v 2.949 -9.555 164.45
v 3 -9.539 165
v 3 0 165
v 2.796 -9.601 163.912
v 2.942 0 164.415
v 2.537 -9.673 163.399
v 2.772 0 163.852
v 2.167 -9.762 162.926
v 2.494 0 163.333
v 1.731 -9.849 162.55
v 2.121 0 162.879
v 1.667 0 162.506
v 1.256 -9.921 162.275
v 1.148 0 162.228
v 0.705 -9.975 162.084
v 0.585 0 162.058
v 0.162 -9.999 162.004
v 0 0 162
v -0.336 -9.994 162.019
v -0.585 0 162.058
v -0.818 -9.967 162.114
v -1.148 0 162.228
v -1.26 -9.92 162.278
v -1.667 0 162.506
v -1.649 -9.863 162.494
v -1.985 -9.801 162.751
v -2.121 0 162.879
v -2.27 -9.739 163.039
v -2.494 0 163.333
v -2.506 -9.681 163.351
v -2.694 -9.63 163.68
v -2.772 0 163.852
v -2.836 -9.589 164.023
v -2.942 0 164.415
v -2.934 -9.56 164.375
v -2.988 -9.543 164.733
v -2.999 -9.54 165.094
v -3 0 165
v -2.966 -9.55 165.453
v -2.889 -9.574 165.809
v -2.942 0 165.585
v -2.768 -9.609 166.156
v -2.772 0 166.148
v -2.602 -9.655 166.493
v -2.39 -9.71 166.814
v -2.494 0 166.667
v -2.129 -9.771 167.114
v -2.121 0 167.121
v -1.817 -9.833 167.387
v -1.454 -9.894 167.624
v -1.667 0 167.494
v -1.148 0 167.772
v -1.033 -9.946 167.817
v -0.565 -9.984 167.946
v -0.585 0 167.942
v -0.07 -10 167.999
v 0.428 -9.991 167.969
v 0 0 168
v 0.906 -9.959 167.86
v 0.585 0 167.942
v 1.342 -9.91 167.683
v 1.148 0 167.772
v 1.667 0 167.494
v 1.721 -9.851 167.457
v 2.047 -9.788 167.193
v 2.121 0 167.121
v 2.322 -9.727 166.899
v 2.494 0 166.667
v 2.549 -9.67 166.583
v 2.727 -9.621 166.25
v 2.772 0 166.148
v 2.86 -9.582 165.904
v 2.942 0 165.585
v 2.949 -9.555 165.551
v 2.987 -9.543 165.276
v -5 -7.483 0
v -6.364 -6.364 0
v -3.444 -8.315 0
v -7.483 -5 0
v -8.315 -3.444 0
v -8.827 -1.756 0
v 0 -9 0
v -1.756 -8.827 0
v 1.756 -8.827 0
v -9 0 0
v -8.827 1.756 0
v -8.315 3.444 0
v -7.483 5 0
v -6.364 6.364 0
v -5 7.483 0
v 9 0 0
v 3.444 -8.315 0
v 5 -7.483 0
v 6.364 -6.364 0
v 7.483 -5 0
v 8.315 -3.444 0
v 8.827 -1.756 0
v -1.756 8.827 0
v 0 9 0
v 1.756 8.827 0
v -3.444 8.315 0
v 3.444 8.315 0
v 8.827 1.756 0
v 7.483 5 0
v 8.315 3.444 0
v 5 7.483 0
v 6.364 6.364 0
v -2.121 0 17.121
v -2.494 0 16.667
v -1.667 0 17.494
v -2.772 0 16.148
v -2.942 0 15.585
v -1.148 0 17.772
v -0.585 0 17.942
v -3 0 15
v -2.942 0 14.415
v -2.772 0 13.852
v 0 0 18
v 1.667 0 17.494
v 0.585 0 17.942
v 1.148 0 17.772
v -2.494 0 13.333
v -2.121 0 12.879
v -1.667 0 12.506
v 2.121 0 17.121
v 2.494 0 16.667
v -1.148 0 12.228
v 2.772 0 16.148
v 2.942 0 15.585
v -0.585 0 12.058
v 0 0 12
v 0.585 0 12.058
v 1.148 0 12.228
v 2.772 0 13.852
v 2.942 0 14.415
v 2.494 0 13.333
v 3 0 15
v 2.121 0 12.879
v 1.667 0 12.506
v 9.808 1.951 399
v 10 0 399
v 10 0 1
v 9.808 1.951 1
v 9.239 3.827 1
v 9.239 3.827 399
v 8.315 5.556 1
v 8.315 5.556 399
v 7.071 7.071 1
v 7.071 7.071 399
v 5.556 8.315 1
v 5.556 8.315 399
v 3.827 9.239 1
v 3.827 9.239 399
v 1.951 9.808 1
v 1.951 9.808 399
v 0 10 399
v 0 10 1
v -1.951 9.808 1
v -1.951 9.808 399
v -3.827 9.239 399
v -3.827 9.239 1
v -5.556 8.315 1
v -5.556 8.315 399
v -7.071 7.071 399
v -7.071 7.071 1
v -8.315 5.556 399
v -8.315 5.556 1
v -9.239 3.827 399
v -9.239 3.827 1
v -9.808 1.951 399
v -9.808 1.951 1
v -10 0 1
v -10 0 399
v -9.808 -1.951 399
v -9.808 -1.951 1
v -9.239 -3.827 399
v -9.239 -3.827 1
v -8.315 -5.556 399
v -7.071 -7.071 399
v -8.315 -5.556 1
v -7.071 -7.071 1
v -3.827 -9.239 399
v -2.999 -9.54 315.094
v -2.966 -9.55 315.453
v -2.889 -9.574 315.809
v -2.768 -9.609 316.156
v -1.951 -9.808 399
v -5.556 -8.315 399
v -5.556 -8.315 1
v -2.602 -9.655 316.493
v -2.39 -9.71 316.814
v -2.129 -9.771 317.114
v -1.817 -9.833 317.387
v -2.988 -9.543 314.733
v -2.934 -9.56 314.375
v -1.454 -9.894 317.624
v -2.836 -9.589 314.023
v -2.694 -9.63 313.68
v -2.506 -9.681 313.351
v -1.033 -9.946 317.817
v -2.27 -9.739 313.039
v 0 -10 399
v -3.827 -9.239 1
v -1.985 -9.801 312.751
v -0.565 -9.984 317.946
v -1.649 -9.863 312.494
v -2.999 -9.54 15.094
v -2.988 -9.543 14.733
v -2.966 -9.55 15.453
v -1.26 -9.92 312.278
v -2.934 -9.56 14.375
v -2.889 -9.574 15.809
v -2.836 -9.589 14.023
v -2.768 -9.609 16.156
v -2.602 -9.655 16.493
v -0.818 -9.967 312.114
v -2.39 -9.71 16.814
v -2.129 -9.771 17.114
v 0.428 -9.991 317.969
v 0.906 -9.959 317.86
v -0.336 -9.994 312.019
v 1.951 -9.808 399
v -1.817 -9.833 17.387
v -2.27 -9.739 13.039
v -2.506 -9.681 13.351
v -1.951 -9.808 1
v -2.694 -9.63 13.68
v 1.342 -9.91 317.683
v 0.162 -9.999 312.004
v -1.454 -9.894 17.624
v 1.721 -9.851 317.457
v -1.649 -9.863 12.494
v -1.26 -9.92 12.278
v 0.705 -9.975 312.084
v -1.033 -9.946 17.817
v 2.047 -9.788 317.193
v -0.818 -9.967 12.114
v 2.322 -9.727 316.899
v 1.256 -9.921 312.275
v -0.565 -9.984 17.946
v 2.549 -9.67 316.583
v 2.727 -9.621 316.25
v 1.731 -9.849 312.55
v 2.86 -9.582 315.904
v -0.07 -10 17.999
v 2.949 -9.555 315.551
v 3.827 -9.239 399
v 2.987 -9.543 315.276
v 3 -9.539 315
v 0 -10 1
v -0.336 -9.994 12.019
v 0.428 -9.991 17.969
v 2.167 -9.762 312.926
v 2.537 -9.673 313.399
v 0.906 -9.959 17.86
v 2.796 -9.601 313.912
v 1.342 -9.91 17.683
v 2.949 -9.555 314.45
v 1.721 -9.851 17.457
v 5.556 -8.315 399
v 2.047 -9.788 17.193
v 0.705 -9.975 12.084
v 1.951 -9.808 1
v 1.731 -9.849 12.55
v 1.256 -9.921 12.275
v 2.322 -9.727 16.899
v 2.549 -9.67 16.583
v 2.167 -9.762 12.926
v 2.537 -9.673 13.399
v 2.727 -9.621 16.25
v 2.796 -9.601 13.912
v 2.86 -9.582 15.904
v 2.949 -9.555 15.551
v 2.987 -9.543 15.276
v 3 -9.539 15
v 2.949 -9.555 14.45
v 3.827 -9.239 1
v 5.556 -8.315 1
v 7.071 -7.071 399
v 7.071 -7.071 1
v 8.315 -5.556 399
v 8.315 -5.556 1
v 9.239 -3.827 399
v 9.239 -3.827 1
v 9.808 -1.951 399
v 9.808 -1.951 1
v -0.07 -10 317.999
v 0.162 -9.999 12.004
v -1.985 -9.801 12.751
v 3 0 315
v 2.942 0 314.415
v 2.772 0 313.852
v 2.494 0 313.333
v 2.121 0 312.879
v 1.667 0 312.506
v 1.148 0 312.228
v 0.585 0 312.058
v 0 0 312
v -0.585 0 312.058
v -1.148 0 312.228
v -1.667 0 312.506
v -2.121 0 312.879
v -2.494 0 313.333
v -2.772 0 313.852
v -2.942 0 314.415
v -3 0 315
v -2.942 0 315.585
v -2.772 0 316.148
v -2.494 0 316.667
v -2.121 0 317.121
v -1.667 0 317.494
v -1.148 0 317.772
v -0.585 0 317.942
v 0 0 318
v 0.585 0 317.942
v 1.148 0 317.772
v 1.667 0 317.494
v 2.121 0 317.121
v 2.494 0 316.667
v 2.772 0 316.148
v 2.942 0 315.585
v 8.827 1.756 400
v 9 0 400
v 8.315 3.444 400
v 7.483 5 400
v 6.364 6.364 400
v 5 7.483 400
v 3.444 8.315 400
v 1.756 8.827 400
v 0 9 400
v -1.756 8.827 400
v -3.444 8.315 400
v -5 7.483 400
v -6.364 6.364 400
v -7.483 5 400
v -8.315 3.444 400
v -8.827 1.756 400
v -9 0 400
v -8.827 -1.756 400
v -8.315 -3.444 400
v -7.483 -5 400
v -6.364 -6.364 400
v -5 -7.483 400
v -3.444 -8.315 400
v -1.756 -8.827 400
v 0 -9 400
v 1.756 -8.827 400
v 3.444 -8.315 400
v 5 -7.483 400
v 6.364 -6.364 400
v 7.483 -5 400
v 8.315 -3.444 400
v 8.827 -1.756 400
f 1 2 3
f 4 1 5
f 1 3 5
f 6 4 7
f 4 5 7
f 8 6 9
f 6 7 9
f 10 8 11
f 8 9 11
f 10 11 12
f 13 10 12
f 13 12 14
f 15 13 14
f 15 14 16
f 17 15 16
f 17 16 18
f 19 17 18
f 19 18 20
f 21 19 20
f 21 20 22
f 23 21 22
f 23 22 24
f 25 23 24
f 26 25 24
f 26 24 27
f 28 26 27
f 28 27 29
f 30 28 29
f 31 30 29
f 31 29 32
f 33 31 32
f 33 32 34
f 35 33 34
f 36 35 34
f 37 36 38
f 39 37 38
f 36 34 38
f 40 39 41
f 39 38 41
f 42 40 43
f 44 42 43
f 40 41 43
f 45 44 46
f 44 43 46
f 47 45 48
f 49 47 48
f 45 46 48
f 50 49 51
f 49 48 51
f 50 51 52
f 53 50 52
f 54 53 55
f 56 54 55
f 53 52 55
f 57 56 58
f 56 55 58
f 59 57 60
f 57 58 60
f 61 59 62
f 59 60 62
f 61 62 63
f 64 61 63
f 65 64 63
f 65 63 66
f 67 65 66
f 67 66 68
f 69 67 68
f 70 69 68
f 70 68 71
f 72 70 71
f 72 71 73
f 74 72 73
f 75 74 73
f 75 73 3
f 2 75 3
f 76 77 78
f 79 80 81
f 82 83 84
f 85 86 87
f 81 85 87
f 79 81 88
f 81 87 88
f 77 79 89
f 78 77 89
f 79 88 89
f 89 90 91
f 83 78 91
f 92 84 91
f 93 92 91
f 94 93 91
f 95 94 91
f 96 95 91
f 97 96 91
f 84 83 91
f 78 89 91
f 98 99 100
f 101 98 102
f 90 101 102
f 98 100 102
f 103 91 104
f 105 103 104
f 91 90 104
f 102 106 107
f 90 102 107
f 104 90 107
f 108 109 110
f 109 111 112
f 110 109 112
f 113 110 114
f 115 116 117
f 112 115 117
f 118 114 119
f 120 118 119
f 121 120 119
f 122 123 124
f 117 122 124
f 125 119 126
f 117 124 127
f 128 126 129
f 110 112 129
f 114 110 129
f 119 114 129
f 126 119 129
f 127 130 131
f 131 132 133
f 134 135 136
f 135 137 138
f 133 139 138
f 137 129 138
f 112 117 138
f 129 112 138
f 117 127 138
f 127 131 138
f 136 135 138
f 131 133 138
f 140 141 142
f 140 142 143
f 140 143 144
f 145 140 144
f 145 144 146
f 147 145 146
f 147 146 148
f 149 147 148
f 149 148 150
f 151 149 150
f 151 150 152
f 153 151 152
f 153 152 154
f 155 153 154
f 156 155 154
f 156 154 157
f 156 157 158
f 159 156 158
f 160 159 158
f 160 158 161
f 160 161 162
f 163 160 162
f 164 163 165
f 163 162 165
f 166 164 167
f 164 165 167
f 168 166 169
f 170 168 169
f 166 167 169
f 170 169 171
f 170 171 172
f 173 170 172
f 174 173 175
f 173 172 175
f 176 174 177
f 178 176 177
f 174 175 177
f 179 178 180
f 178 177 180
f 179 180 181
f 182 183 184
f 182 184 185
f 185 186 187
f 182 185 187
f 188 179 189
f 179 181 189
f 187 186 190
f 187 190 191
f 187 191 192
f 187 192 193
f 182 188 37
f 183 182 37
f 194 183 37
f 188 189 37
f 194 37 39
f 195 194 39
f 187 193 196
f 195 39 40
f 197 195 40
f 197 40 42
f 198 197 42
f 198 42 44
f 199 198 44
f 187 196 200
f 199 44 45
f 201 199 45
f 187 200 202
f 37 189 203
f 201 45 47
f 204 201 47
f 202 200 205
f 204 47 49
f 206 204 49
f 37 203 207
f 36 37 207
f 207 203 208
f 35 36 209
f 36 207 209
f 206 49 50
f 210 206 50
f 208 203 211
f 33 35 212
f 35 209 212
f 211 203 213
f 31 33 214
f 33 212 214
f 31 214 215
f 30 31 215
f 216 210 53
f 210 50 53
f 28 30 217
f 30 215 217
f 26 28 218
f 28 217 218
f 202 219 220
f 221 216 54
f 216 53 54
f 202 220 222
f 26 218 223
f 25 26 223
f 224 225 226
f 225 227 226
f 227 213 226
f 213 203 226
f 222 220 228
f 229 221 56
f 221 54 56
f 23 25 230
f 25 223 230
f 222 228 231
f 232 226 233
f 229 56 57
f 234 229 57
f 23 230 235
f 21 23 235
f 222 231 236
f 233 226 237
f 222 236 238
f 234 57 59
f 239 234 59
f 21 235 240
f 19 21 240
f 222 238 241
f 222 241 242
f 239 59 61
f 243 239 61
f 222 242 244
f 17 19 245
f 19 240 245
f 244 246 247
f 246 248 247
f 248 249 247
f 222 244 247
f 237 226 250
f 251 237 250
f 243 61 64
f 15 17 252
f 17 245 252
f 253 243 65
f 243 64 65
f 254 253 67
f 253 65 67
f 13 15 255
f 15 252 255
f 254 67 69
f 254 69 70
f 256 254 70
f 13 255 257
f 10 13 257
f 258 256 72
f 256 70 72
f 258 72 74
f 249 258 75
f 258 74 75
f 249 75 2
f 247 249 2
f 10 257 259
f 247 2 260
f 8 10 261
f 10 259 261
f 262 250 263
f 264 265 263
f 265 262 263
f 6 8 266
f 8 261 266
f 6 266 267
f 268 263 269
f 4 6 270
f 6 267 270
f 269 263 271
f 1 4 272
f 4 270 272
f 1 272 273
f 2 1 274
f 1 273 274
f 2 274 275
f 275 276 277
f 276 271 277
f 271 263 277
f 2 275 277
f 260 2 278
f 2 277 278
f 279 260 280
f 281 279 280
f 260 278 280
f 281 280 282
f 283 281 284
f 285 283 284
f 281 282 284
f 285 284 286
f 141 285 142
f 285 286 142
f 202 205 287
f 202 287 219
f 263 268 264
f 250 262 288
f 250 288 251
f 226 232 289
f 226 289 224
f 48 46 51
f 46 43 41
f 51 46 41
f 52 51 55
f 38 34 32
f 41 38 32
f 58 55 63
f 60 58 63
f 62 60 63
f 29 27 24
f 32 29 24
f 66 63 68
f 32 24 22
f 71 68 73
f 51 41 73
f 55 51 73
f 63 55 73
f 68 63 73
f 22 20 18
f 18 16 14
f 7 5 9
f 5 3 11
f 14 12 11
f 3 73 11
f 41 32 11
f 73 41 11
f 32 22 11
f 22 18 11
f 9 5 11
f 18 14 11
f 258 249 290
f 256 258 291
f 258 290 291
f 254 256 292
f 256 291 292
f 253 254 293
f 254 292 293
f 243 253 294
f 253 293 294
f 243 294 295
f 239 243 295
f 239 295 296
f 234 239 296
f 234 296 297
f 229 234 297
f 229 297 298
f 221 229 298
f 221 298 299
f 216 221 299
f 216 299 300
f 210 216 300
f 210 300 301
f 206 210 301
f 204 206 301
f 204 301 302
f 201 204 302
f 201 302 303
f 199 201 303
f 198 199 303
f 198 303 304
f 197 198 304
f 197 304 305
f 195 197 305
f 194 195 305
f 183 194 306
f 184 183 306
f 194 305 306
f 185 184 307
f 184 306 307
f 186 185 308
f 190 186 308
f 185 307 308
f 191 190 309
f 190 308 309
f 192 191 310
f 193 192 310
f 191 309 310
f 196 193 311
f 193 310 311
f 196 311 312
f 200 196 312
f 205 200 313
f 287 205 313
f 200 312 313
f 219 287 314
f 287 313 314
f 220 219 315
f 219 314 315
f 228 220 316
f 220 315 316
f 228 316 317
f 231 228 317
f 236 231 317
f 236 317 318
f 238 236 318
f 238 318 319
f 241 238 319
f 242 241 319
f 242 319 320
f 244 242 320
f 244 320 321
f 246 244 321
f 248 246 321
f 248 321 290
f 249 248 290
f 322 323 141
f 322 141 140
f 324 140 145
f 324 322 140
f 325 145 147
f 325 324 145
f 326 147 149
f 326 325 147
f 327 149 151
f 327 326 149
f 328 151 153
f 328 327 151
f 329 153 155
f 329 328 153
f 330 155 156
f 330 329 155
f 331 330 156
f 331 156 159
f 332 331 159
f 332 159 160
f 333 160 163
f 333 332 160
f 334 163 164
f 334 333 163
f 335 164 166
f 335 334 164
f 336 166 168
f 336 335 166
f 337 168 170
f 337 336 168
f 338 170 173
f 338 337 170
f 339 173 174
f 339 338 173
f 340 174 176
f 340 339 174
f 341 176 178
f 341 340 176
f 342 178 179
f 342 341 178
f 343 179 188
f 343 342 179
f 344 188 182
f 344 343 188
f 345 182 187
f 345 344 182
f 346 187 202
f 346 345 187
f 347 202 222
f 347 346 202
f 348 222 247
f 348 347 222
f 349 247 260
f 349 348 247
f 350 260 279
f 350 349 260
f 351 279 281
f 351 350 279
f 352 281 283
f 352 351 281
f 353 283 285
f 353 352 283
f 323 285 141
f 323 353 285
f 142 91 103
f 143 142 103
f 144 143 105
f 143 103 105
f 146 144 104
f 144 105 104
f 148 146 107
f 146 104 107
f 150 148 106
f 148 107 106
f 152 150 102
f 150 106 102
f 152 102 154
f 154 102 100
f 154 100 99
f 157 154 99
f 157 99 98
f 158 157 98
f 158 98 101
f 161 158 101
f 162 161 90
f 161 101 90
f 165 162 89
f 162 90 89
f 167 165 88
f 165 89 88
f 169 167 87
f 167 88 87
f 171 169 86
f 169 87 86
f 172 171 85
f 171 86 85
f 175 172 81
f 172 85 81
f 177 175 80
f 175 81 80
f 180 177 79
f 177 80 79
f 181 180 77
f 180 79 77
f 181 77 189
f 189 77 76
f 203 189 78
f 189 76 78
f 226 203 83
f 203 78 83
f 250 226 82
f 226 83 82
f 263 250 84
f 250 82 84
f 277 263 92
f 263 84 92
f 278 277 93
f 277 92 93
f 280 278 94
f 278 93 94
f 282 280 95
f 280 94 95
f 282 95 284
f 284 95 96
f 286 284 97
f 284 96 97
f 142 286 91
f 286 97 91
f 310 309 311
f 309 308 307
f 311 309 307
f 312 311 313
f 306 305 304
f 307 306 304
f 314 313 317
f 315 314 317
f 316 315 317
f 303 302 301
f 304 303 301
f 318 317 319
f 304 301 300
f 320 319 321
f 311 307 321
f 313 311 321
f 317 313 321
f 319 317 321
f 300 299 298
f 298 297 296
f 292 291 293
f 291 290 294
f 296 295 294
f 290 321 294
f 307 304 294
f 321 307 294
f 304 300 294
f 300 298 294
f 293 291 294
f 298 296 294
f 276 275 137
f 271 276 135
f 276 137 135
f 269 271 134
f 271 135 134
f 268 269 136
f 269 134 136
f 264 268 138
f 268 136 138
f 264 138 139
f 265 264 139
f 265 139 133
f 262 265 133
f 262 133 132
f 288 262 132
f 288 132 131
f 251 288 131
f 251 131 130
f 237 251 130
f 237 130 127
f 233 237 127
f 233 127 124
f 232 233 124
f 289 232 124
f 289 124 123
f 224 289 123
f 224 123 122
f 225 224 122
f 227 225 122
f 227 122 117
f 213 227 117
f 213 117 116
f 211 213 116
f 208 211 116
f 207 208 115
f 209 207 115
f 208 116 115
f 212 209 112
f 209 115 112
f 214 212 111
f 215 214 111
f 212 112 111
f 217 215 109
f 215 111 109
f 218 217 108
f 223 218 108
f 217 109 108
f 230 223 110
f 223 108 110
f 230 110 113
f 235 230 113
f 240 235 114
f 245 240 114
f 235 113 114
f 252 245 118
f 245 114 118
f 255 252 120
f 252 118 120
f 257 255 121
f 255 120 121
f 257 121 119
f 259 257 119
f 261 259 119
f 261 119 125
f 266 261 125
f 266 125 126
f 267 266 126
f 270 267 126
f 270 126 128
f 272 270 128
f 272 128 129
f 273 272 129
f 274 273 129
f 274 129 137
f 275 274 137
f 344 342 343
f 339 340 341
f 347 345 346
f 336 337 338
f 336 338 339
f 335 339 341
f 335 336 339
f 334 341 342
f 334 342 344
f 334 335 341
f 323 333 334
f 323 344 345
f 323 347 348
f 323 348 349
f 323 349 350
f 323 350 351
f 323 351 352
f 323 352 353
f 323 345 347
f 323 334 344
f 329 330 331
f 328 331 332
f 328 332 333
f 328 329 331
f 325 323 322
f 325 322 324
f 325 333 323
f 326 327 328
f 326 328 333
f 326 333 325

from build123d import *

# Parameters (mm, degrees)
SKETCH1_R           = 10
BOSS_EXTRUDE1_DEPTH = 400
CHAMFER1_SIZE       = 1
SKETCH2_R           = 3
CUT_EXTRUDE1_DEPTH  = 10
LPATTERN1_COUNT     = 3
LPATTERN1_PITCH     = 150


with BuildPart() as part:
    # Sketch1 → Boss-Extrude1 (new body)
    with BuildSketch(Plane.XY):
        Circle(SKETCH1_R)
    extrude(amount=BOSS_EXTRUDE1_DEPTH)

    # Chamfer1
    chamfer1_edges = [part.edges().sort_by_distance(p)[0] for p in [
        (-10, 0, 0),
        (-10, 0, 400),
    ]]
    chamfer(chamfer1_edges, length=CHAMFER1_SIZE)

    # Sketch2 → Cut-Extrude1 (cut)
    with BuildSketch(Plane(origin=(0, 0, 0), x_dir=(1, 0, 0), z_dir=(0, 1, 0))):
        with Locations((0, -15)):
            Circle(SKETCH2_R)
    cut_extrude1 = extrude(amount=-CUT_EXTRUDE1_DEPTH, mode=Mode.SUBTRACT)

    # LPattern1: Cut-Extrude1 ×3
    with Locations(*[(0, 0, i * LPATTERN1_PITCH) for i in range(1, LPATTERN1_COUNT)]):
        add(cut_extrude1, mode=Mode.SUBTRACT)


solid = part.part
